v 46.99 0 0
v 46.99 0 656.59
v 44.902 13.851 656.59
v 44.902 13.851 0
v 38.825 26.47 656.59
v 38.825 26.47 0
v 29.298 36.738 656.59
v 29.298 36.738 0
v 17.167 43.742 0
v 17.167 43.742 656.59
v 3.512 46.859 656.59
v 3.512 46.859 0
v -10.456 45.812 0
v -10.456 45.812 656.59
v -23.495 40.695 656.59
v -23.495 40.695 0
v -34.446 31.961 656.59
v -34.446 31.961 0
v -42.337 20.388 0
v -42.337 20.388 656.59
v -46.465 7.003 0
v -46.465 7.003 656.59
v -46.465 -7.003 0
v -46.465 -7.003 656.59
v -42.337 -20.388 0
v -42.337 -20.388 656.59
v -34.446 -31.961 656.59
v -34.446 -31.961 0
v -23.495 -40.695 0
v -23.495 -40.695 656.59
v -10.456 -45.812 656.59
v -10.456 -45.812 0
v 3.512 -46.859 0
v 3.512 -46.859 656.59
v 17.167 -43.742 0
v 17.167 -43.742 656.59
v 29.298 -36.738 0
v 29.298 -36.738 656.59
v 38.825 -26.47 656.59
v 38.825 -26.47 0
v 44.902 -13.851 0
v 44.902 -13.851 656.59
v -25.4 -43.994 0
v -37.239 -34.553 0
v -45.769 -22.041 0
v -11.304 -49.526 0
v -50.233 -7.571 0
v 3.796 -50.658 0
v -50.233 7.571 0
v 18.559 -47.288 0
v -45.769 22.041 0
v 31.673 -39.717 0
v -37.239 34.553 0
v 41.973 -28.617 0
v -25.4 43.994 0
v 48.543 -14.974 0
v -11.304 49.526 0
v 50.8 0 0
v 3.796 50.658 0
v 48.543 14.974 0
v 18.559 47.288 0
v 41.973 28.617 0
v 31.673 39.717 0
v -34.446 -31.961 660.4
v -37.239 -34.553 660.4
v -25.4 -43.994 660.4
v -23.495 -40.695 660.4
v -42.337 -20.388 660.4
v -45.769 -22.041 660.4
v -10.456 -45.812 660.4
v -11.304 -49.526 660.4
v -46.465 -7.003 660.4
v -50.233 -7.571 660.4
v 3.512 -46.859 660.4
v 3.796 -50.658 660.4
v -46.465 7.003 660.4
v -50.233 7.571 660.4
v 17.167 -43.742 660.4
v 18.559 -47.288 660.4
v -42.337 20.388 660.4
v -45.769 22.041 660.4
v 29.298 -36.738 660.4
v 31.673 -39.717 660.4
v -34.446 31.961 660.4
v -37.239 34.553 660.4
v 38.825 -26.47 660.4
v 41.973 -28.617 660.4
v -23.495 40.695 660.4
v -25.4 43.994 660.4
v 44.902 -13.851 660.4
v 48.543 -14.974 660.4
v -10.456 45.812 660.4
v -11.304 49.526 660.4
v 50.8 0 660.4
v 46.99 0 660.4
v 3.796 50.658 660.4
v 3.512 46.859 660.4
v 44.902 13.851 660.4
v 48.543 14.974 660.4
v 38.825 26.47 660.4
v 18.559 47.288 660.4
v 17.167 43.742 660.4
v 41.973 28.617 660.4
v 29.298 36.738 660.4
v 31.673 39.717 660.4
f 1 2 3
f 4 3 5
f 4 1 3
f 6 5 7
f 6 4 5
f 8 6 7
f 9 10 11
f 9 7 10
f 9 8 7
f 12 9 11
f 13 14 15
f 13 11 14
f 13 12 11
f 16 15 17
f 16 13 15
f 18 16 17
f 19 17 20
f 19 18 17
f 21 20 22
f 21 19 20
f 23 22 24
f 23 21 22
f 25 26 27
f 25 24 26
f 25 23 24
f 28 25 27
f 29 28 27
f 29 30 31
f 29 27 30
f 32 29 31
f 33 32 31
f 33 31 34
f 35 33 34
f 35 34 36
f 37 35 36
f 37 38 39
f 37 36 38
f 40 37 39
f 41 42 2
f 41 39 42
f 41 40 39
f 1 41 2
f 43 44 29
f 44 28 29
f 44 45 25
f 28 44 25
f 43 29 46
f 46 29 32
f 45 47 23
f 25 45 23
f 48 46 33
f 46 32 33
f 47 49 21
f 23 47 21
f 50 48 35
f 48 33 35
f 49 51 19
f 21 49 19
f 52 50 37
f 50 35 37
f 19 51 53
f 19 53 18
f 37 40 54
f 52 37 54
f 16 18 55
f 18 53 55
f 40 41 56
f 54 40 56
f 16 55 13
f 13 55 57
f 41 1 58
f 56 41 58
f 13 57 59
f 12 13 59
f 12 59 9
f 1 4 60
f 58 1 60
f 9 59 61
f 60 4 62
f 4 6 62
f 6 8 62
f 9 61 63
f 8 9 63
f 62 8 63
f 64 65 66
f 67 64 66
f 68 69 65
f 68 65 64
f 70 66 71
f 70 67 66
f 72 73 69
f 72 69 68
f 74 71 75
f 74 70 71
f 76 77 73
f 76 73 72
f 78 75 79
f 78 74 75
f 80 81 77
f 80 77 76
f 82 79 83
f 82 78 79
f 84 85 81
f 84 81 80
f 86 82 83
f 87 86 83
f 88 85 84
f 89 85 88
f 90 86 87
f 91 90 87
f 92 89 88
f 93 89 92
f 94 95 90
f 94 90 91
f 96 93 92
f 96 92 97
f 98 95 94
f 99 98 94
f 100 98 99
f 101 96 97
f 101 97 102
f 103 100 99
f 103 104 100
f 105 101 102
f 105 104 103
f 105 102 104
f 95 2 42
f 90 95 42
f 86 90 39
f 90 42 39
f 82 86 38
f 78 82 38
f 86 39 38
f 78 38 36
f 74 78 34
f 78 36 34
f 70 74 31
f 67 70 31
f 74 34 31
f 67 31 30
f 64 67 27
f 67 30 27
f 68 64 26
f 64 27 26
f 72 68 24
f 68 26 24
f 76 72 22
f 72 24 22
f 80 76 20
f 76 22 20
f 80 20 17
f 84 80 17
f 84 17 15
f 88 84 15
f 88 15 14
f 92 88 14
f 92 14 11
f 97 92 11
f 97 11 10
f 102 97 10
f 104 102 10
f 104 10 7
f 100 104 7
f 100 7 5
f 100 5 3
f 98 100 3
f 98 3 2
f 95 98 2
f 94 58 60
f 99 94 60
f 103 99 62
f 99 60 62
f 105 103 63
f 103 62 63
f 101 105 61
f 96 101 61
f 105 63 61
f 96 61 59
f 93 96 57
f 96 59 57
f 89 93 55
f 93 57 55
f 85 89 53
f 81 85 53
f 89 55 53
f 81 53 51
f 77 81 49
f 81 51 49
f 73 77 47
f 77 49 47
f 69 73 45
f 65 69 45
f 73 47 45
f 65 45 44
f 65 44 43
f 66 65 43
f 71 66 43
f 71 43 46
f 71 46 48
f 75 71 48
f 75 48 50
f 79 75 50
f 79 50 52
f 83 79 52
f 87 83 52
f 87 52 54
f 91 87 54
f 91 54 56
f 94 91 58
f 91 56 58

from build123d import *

# Parameters (mm, degrees)
F0_R     = 50.8
F1_DEPTH = 660.4
F2_T     = -3.81
F3_R     = 46.99
F4_DEPTH = 660.401


with BuildPart() as f1:
    # F0 (on Top) → F1 (new body)
    with BuildSketch(Plane.XY):
        Circle(F0_R)
    extrude(amount=F1_DEPTH)

    # F2
    f2_openings = [f1.faces().sort_by_distance(p)[0] for p in [
        (0, 0, 0),
    ]]
    offset(amount=F2_T, openings=f2_openings)

    # F3 (on face) → F4 (cut, through all)
    with BuildSketch(Plane(origin=(0, 0, 0), x_dir=(1, 0, 0), z_dir=(0, 0, -1))):
        Circle(F3_R)
    extrude(amount=-F4_DEPTH, mode=Mode.SUBTRACT)


solid = f1.part
